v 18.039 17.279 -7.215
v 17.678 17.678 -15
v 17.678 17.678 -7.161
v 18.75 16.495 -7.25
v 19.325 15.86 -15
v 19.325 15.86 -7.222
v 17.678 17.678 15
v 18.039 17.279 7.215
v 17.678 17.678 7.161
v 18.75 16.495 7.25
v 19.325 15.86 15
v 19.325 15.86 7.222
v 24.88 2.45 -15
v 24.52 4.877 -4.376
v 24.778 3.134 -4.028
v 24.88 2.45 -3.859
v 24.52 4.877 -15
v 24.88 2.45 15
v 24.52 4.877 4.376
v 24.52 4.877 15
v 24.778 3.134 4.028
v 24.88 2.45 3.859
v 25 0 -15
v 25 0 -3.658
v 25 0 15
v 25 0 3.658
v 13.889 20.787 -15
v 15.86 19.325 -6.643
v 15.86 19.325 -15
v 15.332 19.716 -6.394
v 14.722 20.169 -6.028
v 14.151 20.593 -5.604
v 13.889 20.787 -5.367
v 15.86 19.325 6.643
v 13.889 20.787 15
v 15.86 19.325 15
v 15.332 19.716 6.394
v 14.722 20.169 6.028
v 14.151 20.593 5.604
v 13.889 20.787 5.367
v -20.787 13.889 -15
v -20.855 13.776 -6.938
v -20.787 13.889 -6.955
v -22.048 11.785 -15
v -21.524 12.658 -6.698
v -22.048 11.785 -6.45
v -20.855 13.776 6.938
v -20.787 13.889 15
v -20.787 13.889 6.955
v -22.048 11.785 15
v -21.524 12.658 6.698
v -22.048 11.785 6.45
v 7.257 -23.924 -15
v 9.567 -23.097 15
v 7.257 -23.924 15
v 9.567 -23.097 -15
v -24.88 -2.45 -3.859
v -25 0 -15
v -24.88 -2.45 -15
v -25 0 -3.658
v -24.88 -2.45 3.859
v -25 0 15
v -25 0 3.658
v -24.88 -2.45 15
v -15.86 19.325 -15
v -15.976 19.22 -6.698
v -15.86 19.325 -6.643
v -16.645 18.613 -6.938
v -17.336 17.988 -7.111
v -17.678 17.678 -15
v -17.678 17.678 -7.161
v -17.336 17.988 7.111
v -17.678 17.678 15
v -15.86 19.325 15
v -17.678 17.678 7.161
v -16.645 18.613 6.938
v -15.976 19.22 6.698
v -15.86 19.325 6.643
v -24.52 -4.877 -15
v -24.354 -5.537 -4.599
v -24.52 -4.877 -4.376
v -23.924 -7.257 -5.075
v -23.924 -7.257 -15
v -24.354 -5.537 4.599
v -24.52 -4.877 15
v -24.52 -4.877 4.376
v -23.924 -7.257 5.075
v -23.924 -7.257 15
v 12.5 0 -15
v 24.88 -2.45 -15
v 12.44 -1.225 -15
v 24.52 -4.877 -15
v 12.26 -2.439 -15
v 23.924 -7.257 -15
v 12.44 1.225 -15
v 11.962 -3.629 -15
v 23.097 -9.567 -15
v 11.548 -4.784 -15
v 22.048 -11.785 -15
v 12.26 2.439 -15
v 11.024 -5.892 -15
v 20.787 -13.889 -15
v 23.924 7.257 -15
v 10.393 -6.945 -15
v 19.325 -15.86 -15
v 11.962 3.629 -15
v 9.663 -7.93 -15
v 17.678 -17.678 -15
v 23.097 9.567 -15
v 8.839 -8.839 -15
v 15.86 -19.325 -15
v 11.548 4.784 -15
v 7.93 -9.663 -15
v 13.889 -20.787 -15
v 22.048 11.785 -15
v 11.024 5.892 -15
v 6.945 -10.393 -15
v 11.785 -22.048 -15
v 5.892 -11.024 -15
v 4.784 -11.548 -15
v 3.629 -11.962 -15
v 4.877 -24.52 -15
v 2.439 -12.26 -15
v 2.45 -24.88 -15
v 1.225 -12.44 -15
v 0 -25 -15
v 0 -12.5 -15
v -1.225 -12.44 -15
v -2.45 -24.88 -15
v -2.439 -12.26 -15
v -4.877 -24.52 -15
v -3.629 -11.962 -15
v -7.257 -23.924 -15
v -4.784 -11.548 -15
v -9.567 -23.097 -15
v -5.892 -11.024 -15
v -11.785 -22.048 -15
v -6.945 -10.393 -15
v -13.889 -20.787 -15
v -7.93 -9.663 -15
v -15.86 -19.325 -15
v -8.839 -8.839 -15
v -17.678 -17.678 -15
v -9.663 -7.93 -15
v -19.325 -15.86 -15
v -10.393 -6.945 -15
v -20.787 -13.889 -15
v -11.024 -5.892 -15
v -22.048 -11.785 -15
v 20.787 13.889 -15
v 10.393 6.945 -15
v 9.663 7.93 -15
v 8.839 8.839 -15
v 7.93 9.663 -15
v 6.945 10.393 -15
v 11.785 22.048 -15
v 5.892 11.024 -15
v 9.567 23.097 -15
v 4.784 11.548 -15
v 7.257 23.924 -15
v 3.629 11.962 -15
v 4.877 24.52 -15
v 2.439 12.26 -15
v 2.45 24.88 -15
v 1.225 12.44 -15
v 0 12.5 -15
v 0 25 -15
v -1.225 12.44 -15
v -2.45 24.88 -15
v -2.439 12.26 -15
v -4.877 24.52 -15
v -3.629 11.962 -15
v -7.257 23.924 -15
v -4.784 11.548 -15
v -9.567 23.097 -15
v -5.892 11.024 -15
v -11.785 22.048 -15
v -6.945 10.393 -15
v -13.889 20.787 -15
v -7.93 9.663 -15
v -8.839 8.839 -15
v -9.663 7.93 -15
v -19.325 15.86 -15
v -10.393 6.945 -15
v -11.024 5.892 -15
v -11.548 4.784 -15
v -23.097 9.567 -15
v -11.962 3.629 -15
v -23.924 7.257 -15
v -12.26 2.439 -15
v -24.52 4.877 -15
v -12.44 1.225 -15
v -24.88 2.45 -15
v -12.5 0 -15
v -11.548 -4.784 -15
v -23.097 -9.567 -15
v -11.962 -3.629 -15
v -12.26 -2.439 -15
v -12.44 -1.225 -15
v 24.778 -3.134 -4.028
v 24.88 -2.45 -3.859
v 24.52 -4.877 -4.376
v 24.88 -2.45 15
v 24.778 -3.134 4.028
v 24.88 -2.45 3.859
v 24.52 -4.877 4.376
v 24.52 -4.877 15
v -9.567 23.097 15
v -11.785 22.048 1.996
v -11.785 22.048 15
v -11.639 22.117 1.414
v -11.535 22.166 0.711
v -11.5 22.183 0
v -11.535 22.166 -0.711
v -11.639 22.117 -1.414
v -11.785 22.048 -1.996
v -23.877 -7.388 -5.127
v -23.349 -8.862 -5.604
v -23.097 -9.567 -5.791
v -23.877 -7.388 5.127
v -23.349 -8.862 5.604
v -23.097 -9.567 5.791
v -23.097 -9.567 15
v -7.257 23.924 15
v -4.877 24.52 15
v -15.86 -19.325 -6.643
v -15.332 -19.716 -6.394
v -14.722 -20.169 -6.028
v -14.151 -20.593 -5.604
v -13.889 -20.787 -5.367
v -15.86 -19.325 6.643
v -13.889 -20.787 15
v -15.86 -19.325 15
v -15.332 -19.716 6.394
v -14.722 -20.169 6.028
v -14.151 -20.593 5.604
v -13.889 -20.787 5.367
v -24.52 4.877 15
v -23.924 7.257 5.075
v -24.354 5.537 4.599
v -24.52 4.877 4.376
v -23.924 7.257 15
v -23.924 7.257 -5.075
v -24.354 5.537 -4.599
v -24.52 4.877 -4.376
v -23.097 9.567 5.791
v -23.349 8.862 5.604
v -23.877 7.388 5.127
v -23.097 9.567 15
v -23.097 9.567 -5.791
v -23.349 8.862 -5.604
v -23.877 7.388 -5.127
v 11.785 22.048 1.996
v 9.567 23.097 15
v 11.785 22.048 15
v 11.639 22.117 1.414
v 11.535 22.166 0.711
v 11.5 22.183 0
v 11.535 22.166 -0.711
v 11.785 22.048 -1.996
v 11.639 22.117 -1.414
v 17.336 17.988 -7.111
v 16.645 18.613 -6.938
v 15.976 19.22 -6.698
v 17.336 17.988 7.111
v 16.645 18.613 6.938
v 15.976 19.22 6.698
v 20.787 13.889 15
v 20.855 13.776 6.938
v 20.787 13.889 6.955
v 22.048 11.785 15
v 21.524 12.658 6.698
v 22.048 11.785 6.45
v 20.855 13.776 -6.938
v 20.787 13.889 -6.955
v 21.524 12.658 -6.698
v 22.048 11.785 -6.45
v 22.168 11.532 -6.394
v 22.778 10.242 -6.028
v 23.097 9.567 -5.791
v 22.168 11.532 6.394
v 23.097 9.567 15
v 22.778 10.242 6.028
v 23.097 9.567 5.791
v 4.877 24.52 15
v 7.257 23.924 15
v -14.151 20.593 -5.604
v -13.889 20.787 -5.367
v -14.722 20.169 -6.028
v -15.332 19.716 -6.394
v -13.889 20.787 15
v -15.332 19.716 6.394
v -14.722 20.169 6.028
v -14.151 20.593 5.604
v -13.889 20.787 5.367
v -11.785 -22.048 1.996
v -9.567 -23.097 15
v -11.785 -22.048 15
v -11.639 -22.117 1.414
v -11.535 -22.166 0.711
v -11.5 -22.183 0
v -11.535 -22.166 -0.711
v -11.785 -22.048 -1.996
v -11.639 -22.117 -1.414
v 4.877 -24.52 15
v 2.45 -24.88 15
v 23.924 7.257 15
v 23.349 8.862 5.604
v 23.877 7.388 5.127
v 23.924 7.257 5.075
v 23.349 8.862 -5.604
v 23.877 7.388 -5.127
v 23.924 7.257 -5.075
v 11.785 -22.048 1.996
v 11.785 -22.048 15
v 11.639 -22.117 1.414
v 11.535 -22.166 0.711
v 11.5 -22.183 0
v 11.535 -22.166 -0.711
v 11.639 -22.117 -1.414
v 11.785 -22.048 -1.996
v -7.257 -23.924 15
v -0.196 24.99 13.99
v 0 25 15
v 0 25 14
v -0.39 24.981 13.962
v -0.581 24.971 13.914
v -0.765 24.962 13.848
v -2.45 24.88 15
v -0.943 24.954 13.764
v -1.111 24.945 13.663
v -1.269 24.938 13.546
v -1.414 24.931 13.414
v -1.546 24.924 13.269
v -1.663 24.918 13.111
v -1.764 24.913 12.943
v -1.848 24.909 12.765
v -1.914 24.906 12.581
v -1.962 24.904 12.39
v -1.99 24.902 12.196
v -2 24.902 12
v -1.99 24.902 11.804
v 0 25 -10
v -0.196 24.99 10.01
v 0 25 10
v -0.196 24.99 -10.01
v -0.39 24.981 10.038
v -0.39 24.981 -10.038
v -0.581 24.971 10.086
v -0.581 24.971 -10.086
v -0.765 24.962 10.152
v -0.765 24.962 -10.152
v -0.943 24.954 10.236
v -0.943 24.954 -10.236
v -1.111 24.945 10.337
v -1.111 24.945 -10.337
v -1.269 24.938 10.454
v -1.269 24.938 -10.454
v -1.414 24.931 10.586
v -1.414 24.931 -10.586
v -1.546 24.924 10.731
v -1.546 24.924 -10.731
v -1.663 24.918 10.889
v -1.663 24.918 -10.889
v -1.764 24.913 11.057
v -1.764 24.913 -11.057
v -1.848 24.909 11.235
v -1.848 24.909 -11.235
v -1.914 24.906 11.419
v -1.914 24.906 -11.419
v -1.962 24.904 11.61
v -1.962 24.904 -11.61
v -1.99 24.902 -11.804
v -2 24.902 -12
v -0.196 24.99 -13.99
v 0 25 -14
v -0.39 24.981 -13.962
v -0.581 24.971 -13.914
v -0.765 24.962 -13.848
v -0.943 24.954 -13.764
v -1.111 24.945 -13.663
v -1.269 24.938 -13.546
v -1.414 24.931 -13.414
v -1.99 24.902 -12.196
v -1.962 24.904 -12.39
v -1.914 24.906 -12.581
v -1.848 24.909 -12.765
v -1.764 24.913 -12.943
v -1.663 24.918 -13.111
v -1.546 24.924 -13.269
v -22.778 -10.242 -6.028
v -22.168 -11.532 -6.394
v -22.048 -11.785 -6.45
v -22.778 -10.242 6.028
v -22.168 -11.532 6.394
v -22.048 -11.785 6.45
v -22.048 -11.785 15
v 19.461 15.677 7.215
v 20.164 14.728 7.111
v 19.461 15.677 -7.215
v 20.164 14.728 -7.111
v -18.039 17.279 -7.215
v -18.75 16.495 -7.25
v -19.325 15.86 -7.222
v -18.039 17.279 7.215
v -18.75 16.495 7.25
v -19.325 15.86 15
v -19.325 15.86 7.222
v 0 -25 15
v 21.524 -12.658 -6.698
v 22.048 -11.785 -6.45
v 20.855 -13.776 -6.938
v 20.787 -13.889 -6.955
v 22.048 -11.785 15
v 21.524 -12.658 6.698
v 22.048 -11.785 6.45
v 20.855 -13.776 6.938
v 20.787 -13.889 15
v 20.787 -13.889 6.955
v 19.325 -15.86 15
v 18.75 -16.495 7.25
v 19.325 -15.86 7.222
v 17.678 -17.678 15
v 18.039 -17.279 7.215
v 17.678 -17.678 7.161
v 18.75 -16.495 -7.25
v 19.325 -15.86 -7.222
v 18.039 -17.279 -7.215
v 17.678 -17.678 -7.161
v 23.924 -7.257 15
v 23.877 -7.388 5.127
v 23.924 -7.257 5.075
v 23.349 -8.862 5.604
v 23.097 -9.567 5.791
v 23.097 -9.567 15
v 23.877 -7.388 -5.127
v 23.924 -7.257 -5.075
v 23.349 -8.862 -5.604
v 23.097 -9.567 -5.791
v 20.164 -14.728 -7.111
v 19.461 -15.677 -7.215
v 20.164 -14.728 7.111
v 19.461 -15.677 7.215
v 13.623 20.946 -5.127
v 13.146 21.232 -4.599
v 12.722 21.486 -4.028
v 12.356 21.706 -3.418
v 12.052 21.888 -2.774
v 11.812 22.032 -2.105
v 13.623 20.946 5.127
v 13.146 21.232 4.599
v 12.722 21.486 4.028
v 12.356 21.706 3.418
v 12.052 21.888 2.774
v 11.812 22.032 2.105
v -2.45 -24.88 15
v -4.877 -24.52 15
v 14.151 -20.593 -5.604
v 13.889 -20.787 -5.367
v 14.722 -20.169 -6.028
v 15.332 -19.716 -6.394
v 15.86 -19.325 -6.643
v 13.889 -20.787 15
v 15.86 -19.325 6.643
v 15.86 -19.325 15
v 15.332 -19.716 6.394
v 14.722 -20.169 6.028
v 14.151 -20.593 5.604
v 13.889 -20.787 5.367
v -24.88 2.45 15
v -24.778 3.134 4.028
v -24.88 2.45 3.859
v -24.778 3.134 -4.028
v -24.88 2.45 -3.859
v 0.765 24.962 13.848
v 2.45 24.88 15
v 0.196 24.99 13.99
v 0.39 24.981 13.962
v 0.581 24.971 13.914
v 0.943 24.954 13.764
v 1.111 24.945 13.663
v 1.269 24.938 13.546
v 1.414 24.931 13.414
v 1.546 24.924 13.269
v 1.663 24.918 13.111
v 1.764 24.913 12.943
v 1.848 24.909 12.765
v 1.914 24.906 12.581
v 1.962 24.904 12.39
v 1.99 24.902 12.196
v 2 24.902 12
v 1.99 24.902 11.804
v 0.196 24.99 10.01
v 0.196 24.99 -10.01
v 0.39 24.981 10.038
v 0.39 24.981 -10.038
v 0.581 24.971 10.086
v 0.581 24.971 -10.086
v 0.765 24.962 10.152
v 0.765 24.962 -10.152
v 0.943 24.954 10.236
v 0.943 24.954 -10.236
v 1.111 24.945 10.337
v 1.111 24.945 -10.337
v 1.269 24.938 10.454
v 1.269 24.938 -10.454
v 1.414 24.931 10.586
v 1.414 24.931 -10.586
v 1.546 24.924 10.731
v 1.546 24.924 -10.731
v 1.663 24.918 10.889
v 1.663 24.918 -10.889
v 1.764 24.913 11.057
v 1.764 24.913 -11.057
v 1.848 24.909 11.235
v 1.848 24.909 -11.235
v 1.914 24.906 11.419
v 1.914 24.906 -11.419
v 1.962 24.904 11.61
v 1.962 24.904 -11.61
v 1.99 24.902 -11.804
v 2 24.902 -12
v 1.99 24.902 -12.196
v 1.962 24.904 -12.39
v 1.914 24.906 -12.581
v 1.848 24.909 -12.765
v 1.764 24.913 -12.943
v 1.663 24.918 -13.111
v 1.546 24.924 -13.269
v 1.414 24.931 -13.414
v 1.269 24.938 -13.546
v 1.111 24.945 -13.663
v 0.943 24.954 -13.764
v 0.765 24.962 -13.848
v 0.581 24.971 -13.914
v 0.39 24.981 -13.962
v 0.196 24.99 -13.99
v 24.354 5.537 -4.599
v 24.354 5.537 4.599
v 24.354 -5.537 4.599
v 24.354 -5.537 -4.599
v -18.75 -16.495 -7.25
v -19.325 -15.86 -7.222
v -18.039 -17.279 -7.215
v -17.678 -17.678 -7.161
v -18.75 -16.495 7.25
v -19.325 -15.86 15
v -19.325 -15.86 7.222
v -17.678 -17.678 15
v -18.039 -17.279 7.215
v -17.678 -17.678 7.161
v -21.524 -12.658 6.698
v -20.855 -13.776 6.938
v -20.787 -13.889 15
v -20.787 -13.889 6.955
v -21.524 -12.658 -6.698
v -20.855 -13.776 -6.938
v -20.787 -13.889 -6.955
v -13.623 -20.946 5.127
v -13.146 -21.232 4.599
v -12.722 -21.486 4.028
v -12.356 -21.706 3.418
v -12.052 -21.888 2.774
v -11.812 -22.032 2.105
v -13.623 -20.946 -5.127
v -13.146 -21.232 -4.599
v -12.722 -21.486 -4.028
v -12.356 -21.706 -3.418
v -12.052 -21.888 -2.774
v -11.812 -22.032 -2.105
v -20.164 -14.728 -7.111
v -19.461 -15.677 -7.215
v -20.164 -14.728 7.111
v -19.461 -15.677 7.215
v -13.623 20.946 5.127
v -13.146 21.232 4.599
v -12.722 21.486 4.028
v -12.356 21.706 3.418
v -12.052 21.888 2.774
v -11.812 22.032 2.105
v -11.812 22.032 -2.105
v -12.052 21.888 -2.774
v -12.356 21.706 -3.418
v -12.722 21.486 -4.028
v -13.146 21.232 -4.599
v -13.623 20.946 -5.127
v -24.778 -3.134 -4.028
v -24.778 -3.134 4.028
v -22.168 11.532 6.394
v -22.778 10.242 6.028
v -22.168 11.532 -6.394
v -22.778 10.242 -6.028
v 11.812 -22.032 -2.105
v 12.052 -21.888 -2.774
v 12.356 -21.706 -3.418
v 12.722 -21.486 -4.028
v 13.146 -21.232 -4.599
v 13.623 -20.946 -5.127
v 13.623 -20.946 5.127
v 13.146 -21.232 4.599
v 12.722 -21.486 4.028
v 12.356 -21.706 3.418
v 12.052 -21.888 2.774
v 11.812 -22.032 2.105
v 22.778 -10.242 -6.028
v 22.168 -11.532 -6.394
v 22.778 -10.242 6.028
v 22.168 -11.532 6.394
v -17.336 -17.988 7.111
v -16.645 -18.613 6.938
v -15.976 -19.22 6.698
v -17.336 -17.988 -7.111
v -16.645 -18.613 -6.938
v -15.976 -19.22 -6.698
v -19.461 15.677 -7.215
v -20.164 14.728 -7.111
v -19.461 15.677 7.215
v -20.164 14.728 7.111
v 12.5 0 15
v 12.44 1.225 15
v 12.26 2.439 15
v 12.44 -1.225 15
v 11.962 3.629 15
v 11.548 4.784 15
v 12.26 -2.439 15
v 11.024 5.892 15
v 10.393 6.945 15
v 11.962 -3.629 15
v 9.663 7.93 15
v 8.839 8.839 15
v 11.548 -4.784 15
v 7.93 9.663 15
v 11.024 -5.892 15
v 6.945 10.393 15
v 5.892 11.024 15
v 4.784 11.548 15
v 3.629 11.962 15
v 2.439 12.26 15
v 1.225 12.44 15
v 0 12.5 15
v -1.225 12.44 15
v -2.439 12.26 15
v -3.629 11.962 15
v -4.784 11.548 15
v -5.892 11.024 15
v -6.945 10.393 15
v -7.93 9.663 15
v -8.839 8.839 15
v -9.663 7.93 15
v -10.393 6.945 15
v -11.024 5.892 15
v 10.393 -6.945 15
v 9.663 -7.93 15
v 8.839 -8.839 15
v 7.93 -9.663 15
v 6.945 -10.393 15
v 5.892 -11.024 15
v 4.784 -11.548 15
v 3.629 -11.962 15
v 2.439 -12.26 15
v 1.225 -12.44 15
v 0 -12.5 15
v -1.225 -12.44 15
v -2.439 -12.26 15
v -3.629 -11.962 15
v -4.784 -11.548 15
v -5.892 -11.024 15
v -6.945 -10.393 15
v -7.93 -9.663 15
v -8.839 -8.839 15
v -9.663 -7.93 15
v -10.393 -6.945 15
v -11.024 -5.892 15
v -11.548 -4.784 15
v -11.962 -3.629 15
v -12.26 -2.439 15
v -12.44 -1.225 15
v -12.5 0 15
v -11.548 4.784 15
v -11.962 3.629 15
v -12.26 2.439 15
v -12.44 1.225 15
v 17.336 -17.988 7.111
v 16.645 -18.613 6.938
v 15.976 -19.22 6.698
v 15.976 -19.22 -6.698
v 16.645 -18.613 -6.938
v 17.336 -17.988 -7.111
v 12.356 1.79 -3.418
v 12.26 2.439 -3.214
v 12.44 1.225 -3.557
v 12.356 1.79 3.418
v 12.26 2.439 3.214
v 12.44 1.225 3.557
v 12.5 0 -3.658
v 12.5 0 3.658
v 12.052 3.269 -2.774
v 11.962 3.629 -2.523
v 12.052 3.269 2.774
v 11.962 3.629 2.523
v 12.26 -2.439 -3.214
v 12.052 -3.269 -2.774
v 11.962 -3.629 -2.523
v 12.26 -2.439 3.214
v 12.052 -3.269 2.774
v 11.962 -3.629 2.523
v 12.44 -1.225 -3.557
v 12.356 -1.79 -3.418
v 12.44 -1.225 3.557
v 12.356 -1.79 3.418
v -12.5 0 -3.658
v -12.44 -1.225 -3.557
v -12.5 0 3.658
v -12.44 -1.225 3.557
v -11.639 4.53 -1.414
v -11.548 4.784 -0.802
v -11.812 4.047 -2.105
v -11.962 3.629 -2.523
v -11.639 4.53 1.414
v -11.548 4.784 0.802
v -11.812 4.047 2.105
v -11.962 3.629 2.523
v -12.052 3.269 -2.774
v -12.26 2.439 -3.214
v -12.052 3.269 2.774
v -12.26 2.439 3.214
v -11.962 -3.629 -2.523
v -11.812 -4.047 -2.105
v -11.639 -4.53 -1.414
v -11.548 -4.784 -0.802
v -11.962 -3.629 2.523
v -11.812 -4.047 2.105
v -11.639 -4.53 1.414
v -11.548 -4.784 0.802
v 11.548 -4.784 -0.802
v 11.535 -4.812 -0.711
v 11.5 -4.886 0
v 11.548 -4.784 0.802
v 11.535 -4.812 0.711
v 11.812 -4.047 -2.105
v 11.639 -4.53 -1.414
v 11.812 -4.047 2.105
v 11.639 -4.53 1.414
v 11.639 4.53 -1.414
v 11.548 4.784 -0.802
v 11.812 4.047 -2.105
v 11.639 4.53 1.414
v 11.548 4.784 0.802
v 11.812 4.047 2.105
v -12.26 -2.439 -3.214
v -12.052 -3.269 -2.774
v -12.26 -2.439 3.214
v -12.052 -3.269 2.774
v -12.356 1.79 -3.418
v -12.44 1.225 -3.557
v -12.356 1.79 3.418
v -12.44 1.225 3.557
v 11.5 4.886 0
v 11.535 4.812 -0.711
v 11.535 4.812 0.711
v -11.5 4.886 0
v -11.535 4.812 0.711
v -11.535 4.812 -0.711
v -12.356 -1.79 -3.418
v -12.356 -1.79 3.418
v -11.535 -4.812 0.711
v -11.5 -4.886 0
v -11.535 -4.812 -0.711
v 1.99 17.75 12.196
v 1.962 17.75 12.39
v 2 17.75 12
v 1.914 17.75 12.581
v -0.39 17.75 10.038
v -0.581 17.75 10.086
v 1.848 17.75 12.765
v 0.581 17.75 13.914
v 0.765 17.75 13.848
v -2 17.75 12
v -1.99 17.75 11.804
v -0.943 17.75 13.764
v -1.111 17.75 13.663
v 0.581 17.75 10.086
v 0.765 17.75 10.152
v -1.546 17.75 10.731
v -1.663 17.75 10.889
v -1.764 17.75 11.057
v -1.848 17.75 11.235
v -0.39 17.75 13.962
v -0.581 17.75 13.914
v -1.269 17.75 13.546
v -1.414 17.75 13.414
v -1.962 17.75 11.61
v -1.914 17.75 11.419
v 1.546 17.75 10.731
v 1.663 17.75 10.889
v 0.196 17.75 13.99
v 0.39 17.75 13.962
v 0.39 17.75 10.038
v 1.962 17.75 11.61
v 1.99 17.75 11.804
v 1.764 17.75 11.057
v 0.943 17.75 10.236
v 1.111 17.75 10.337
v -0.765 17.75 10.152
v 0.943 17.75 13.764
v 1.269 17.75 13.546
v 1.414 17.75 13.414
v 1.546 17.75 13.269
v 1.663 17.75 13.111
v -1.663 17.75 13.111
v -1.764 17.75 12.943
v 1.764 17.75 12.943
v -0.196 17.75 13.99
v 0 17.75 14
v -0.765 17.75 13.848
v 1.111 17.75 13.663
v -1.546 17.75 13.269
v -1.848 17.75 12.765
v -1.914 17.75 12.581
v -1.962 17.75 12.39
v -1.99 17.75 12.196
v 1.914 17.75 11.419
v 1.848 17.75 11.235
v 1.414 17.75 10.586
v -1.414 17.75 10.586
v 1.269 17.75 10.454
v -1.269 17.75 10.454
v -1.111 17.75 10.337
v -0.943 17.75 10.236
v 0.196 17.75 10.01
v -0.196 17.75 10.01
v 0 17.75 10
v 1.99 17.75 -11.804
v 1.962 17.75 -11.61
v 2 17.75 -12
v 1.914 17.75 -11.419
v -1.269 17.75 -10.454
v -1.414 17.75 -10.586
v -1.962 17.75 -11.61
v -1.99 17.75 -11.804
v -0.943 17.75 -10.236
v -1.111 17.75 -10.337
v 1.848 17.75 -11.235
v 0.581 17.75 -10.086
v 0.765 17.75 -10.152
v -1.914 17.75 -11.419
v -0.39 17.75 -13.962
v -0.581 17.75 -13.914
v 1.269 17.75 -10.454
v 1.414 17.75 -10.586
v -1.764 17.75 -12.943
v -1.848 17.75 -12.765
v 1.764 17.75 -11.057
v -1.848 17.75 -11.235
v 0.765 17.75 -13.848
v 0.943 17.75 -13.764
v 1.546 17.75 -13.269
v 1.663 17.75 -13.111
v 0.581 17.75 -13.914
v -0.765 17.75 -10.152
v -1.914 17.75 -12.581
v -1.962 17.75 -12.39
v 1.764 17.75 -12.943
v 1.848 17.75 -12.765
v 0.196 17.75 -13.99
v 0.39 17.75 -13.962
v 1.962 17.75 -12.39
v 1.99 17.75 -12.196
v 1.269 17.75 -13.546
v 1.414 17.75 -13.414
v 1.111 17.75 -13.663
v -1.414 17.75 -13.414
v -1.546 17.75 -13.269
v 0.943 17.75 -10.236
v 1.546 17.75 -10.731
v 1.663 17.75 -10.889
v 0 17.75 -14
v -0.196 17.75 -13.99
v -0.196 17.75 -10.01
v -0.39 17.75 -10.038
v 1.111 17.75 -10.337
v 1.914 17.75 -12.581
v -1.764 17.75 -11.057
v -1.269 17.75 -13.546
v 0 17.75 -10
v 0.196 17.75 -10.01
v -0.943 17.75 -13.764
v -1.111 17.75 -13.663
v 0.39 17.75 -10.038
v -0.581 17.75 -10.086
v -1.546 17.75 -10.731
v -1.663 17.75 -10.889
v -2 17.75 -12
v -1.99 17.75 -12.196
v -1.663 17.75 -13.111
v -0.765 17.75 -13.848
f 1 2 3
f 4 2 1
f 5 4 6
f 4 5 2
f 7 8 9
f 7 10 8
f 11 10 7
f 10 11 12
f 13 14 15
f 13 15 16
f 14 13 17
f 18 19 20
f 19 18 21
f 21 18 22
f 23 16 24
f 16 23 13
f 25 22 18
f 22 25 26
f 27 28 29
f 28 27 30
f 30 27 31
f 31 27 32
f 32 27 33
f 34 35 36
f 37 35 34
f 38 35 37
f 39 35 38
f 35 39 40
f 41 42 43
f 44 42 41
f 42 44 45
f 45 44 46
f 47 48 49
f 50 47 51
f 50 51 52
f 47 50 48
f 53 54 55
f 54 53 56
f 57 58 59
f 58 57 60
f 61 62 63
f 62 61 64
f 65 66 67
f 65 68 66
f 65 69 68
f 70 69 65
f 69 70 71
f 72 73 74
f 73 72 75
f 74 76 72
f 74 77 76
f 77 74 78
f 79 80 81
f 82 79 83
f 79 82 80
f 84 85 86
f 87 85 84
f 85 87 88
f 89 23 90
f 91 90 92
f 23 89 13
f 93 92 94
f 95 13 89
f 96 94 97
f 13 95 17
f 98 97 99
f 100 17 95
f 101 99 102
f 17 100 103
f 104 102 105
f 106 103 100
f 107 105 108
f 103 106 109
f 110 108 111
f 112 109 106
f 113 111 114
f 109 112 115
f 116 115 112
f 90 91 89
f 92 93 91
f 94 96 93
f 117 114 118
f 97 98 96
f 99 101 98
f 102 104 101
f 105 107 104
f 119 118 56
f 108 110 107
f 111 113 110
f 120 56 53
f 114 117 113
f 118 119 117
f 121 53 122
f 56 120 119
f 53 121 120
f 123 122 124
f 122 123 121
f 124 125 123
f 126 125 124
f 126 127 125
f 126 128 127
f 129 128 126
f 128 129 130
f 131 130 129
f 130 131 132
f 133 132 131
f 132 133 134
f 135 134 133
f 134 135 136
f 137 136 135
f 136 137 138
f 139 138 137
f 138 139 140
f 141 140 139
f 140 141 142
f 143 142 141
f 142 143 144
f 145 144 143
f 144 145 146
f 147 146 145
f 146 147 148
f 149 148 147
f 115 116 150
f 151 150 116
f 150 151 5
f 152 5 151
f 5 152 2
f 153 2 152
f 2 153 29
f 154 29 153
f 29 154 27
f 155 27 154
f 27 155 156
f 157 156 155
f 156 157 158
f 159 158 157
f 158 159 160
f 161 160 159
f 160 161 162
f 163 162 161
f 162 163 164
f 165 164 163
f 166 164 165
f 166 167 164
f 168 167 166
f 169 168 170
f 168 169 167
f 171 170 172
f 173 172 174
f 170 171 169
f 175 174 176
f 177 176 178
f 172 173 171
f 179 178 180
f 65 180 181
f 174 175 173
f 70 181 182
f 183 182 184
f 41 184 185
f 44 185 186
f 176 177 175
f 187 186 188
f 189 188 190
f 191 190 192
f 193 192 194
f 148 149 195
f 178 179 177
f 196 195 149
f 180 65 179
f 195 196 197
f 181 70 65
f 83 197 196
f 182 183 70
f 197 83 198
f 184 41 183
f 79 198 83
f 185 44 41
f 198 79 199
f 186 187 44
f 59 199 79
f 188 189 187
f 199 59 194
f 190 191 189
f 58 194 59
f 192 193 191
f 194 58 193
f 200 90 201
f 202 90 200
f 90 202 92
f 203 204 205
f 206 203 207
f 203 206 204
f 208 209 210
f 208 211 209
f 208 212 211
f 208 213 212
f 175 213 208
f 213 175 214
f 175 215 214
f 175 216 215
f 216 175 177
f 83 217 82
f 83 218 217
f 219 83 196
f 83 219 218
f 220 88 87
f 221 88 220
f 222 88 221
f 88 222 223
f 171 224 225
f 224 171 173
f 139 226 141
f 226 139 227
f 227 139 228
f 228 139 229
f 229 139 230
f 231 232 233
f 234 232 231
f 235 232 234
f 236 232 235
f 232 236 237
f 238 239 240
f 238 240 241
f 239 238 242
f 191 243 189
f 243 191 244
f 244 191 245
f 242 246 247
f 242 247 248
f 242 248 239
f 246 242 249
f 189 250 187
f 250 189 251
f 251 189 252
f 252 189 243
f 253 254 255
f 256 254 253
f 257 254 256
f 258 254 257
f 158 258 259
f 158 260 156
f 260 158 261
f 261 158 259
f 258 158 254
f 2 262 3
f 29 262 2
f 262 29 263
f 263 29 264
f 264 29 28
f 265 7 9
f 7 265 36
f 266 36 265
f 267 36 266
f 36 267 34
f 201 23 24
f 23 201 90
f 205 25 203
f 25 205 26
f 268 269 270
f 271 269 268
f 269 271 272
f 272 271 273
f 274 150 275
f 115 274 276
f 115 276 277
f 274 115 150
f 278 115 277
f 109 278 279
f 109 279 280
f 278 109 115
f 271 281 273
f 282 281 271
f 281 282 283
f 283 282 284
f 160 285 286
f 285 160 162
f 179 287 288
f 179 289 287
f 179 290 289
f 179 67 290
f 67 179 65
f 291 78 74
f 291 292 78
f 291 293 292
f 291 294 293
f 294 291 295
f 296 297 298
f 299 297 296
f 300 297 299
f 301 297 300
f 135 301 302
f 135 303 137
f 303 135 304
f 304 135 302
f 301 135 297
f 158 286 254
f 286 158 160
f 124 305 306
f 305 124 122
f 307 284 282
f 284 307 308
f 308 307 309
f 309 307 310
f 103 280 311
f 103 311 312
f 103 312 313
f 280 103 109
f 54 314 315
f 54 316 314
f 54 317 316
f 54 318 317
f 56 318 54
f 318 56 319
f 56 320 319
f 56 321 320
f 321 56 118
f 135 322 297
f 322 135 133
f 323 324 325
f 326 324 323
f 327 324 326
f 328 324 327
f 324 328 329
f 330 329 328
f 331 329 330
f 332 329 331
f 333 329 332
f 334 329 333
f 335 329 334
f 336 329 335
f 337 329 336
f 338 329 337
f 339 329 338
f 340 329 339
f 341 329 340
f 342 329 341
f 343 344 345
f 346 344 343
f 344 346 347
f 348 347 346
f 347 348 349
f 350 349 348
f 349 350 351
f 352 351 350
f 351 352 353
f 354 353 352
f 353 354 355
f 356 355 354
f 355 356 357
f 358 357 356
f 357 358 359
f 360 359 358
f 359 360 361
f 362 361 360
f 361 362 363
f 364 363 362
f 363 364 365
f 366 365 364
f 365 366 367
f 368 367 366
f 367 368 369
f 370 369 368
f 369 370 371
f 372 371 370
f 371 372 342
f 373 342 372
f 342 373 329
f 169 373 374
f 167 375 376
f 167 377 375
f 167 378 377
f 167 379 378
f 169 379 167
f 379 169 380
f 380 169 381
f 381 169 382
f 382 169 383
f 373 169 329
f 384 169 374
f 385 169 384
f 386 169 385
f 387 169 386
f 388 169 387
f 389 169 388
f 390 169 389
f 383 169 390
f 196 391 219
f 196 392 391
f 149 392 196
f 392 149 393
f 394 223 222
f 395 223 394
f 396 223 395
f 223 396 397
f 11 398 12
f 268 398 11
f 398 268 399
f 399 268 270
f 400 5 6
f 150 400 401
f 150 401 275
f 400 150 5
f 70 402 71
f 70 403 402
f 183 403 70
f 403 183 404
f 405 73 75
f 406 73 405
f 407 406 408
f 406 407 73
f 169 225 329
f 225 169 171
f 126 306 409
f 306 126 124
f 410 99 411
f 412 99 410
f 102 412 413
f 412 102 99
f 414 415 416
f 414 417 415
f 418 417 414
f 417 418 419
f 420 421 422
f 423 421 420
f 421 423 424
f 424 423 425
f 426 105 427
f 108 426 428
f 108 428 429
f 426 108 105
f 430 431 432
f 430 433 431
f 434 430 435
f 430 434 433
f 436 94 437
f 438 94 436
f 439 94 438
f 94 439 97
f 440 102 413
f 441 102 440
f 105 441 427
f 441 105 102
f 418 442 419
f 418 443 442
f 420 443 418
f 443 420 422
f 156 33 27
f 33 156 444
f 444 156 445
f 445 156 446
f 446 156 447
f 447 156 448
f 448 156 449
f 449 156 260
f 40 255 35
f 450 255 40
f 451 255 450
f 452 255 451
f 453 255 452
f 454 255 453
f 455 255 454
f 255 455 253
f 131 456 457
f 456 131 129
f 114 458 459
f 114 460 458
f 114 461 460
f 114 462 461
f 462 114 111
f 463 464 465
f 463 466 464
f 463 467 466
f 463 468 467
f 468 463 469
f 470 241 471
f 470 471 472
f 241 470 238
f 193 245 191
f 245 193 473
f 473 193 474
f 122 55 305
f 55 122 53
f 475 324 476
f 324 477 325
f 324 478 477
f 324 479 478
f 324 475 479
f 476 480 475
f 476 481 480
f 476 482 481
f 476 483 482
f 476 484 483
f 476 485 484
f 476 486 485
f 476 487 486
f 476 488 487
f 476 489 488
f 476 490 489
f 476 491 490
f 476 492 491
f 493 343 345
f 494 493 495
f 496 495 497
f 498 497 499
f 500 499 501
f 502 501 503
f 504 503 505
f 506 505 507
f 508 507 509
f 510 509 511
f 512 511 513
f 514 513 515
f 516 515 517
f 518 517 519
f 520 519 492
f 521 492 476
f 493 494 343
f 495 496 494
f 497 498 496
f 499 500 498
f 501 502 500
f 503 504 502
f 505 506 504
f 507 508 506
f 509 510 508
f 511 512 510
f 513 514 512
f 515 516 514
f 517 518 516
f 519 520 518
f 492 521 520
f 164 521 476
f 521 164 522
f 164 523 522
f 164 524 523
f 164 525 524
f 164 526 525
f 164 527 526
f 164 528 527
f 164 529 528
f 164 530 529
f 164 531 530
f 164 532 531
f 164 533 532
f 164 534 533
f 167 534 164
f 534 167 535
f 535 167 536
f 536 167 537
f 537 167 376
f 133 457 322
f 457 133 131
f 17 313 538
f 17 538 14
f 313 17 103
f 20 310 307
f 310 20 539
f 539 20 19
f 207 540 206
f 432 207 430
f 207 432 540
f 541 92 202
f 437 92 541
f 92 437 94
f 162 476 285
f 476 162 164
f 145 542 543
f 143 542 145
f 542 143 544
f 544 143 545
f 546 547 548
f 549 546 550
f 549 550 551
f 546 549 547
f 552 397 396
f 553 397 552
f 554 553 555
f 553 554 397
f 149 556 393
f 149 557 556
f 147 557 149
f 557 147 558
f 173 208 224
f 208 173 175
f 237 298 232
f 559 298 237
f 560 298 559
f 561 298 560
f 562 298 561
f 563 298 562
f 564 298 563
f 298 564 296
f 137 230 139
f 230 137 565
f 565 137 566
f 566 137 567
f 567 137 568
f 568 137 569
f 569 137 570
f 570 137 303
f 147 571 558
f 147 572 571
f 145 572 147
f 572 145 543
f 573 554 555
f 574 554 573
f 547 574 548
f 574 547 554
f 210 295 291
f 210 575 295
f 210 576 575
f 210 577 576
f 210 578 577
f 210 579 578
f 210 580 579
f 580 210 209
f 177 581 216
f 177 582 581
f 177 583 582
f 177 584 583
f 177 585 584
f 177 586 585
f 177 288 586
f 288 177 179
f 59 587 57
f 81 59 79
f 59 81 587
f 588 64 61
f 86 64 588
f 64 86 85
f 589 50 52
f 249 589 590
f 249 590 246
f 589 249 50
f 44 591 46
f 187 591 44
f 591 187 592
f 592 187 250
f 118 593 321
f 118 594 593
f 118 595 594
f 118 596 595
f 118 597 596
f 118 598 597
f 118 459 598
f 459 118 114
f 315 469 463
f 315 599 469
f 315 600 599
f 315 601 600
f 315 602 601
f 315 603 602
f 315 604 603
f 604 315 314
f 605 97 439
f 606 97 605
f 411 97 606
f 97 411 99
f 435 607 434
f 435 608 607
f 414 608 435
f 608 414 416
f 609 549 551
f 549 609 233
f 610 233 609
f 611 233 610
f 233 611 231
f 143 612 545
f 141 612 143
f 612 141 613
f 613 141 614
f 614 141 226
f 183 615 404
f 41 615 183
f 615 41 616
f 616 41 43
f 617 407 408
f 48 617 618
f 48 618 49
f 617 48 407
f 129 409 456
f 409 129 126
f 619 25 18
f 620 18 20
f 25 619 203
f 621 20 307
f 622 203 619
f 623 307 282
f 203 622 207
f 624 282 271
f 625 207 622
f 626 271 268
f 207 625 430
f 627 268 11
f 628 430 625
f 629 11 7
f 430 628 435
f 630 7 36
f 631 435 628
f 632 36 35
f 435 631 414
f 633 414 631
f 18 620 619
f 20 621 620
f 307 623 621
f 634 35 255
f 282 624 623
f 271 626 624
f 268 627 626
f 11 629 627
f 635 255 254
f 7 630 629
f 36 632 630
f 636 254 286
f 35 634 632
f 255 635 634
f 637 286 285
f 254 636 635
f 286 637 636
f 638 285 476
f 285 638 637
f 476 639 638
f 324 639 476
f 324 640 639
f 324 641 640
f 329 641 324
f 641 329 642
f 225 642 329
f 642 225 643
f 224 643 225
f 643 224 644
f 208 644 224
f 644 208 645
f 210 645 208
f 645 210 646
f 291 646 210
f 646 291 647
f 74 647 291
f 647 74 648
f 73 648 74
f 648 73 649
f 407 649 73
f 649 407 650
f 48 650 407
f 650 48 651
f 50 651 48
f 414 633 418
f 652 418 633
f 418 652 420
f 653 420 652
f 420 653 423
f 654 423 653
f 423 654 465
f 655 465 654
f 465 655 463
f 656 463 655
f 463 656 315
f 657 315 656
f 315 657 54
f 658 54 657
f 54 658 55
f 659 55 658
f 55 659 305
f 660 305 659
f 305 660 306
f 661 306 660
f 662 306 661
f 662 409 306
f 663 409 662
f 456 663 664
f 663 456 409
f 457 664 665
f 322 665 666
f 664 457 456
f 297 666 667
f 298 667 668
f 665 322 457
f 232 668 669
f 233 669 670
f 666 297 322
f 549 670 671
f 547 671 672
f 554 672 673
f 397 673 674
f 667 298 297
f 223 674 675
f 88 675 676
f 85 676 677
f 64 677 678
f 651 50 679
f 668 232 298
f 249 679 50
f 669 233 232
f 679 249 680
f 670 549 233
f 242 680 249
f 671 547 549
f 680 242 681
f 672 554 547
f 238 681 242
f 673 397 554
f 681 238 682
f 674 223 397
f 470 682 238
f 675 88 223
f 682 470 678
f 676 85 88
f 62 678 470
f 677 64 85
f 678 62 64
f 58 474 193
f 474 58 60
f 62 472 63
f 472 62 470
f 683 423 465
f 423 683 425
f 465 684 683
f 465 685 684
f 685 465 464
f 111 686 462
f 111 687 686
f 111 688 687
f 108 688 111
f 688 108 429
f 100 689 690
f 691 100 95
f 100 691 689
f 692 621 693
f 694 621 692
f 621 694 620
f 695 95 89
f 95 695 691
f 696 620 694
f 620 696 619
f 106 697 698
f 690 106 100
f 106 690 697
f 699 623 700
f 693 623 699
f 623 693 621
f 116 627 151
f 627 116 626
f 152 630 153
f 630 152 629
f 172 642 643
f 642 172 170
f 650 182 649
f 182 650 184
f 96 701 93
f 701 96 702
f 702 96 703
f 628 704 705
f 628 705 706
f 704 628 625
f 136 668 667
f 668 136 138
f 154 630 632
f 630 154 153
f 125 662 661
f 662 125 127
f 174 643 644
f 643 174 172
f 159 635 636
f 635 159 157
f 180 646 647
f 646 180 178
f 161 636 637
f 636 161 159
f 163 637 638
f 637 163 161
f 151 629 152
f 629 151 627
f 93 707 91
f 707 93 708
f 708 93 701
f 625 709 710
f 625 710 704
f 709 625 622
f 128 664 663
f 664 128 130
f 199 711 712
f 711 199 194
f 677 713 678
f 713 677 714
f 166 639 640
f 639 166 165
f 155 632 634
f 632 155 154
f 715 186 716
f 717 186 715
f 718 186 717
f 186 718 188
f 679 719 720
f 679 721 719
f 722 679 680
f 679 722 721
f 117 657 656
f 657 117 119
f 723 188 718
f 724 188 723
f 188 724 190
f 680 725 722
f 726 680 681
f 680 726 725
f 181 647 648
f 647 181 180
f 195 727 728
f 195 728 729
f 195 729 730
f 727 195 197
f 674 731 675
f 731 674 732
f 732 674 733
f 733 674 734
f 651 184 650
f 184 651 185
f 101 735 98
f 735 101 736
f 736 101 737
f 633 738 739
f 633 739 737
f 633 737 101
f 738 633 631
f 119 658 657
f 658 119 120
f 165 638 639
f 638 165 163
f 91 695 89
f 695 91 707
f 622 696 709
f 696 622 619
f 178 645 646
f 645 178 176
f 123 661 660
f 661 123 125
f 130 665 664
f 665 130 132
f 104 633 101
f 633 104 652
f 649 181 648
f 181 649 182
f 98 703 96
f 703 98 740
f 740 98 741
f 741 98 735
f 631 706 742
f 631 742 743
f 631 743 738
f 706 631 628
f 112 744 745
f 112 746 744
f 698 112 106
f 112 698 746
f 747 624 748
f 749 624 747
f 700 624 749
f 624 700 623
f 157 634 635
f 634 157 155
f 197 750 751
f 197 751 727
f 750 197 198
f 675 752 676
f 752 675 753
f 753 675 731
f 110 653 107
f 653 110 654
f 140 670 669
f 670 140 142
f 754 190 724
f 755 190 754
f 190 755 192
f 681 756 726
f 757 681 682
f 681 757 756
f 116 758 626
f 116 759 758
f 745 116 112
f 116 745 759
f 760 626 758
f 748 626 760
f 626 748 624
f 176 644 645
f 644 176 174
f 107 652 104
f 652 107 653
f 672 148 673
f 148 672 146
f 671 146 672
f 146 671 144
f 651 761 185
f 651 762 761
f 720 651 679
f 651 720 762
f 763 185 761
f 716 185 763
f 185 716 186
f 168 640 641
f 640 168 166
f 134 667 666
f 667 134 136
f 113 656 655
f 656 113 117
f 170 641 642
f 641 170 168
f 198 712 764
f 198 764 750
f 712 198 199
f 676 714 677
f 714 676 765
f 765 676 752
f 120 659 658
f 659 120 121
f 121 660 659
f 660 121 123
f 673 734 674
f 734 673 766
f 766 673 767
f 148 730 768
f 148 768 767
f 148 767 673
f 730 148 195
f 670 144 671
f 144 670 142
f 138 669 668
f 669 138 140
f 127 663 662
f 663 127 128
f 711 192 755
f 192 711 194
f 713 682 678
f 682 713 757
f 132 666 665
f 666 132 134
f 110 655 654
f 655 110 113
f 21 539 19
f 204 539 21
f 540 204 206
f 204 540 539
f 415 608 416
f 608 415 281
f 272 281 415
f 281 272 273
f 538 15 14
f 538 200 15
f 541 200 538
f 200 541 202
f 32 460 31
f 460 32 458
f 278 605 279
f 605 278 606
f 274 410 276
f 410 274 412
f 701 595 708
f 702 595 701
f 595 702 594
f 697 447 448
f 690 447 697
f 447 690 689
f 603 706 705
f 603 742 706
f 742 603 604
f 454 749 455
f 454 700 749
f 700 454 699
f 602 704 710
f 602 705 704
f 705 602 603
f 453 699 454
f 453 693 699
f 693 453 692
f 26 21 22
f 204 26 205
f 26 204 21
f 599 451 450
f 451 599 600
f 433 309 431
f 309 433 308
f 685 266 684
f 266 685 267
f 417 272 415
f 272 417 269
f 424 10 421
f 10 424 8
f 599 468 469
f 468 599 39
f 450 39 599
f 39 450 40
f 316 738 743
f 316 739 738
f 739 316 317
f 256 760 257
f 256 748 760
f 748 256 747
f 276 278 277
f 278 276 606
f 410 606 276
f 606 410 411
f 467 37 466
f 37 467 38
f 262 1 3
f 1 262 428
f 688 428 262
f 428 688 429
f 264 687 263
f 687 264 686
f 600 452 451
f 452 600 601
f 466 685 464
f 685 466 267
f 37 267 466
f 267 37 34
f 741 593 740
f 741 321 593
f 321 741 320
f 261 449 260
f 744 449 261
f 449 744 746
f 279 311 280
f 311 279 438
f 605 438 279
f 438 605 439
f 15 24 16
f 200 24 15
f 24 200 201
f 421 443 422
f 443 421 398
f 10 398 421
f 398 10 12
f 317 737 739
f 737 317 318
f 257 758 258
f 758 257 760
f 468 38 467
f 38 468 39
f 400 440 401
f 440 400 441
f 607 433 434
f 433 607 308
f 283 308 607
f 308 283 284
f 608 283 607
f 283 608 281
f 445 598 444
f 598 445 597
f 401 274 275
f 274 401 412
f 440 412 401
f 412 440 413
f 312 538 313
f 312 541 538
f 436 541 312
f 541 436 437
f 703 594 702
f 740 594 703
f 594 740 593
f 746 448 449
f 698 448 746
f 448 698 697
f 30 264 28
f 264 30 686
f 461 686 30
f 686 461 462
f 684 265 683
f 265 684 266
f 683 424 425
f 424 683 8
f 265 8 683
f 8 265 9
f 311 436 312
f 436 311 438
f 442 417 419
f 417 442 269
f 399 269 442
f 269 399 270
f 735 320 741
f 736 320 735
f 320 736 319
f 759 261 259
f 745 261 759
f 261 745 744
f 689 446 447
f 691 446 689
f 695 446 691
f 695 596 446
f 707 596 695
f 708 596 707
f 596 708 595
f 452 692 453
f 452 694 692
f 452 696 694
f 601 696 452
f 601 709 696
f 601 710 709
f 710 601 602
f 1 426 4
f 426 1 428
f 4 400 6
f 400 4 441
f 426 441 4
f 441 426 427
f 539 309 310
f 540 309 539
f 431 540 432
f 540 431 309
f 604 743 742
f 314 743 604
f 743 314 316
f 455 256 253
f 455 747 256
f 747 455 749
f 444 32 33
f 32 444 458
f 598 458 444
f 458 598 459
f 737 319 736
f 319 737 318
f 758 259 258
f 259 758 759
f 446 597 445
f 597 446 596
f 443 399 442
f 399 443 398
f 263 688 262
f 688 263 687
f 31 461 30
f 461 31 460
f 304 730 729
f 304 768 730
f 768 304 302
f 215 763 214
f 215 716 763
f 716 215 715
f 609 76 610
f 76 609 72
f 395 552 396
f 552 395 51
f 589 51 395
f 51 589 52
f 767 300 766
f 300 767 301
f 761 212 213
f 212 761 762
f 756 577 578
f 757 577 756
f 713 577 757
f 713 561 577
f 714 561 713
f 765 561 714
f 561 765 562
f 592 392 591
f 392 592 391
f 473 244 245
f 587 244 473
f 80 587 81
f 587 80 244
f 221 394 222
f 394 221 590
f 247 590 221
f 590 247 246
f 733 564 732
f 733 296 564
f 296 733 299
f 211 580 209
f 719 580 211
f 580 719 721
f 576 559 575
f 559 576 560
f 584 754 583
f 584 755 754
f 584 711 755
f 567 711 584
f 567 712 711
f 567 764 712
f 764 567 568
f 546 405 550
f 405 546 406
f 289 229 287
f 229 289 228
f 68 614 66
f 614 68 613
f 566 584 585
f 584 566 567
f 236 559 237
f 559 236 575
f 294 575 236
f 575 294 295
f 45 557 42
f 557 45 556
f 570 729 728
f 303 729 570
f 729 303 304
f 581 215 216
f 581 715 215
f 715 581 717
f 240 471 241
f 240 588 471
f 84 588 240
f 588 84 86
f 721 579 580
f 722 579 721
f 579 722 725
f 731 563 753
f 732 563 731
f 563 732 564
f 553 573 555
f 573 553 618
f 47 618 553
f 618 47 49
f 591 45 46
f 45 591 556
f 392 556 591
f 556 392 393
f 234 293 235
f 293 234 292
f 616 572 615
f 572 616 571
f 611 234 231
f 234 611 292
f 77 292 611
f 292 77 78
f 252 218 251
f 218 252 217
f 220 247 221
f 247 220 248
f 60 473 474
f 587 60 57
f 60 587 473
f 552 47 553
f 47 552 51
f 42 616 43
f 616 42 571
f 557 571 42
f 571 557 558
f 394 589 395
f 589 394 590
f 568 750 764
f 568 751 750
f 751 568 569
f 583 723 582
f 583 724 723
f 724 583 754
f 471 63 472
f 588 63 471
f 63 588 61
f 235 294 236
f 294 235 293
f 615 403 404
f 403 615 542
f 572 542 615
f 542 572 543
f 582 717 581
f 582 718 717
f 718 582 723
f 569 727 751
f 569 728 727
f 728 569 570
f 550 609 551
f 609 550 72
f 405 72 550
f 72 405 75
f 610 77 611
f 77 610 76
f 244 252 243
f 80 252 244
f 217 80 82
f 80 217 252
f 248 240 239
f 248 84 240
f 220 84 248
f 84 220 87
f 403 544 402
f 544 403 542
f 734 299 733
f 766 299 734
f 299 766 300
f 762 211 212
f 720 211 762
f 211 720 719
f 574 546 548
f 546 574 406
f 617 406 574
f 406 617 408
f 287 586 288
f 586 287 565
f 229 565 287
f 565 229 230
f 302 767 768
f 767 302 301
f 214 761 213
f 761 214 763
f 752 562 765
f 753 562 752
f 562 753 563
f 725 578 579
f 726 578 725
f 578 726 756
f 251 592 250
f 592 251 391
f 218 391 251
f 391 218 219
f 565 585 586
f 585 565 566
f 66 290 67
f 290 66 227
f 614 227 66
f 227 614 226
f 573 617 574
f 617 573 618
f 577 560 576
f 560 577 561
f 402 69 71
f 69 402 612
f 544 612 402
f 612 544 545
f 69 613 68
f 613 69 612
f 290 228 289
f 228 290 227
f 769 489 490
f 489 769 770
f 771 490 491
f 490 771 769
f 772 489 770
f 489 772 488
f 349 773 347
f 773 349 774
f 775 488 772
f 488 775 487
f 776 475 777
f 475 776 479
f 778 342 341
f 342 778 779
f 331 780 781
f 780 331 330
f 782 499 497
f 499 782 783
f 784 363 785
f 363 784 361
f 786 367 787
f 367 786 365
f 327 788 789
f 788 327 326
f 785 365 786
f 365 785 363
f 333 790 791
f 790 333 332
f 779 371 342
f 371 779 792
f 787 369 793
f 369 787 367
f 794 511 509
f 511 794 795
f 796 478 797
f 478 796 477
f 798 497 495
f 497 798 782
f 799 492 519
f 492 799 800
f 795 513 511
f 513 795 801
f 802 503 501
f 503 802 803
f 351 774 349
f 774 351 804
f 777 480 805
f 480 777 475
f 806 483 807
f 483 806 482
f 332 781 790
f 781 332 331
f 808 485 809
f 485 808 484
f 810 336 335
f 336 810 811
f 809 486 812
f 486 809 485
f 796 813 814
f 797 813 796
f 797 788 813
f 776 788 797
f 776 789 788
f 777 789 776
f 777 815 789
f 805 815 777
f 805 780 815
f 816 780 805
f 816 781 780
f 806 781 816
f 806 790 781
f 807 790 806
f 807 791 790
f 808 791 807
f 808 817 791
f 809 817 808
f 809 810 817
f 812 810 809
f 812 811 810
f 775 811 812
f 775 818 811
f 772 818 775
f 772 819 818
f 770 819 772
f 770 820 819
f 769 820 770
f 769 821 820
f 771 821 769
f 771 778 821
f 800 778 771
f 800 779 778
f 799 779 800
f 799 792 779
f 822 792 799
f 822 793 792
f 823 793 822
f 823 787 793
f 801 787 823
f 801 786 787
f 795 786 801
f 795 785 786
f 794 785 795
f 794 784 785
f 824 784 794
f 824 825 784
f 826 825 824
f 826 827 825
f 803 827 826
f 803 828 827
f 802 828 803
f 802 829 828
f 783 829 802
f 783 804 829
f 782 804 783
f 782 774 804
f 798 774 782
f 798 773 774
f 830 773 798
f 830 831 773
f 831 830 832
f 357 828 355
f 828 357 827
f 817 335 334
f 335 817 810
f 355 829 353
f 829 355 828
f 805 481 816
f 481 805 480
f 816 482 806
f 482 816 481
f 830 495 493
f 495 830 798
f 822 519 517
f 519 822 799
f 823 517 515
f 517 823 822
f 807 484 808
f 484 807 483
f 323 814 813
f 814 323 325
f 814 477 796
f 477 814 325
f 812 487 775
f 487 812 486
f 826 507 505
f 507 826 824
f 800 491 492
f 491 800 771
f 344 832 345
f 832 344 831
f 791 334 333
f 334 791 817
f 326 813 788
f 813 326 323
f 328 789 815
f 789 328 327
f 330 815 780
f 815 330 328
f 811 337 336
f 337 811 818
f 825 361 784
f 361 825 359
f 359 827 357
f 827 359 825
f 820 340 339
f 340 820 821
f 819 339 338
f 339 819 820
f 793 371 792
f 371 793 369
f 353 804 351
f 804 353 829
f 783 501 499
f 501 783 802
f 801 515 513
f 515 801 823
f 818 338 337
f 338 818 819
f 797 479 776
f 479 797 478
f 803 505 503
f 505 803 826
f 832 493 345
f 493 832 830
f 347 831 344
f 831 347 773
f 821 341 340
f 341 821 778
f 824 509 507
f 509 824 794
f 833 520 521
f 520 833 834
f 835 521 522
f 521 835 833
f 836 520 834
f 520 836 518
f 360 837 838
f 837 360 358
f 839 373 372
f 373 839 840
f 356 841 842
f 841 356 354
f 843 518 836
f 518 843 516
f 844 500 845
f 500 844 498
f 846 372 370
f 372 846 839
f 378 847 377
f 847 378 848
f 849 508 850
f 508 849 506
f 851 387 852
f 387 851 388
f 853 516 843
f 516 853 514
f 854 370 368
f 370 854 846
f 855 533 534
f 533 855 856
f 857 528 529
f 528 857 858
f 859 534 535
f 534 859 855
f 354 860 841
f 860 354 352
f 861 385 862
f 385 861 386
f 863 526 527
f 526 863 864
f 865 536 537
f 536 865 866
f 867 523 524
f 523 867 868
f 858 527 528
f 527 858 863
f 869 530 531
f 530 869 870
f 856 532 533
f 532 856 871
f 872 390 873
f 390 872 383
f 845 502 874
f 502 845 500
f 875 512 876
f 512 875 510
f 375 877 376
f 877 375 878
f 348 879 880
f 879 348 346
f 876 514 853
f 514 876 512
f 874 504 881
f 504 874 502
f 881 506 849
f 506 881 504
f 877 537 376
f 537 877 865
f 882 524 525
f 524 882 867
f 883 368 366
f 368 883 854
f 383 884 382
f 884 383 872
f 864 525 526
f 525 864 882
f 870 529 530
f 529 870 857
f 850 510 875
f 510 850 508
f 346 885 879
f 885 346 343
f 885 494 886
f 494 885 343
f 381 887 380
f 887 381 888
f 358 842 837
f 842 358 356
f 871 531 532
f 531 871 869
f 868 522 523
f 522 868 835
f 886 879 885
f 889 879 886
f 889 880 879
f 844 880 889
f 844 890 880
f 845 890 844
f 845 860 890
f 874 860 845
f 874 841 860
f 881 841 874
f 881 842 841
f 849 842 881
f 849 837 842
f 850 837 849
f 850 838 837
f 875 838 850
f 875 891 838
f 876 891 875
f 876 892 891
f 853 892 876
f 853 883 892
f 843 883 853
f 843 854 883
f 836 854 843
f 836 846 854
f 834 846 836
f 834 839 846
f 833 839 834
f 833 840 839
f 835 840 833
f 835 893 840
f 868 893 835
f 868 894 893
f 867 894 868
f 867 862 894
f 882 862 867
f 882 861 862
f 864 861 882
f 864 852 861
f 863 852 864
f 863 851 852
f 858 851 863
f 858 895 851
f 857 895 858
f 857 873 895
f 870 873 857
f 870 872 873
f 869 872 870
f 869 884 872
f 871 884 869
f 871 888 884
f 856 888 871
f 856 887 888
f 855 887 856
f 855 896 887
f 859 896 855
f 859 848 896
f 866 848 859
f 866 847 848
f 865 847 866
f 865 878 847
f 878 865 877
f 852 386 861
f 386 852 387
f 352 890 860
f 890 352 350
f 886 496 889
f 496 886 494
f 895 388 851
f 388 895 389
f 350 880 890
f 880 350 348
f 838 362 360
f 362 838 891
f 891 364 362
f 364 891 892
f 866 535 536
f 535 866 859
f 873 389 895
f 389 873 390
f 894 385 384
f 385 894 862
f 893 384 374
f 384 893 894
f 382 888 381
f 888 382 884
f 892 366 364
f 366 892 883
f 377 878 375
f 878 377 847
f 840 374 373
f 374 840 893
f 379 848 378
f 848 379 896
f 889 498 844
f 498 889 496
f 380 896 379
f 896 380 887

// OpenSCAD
// COBRA Vertebra - S1 V24
// Height: 30.0mm, OD: 50.0mm

$fn = 64;

difference() {
    // Outer cylinder
    cylinder(h=30.0, d=50.0, center=true);
    
    // Inner channel
    cylinder(h=32.0, d=25.0, center=true);

    // Battery cavity 1
    rotate([0, 0, 0])
    translate([18.75, 0, 0])
    rotate([90, 0, 0])
    cylinder(h=58.0, d=14.5, center=true);

    // Battery cavity 2
    rotate([0, 0, 180])
    translate([18.75, 0, 0])
    rotate([90, 0, 0])
    cylinder(h=58.0, d=14.5, center=true);

    // Pivot holes
    translate([0, 25.0, 12.0])
    rotate([90, 0, 0])
    cylinder(h=14.5, d=4, center=true);
    
    translate([0, 25.0, -12.0])
    rotate([90, 0, 0])
    cylinder(h=14.5, d=4, center=true);
}
